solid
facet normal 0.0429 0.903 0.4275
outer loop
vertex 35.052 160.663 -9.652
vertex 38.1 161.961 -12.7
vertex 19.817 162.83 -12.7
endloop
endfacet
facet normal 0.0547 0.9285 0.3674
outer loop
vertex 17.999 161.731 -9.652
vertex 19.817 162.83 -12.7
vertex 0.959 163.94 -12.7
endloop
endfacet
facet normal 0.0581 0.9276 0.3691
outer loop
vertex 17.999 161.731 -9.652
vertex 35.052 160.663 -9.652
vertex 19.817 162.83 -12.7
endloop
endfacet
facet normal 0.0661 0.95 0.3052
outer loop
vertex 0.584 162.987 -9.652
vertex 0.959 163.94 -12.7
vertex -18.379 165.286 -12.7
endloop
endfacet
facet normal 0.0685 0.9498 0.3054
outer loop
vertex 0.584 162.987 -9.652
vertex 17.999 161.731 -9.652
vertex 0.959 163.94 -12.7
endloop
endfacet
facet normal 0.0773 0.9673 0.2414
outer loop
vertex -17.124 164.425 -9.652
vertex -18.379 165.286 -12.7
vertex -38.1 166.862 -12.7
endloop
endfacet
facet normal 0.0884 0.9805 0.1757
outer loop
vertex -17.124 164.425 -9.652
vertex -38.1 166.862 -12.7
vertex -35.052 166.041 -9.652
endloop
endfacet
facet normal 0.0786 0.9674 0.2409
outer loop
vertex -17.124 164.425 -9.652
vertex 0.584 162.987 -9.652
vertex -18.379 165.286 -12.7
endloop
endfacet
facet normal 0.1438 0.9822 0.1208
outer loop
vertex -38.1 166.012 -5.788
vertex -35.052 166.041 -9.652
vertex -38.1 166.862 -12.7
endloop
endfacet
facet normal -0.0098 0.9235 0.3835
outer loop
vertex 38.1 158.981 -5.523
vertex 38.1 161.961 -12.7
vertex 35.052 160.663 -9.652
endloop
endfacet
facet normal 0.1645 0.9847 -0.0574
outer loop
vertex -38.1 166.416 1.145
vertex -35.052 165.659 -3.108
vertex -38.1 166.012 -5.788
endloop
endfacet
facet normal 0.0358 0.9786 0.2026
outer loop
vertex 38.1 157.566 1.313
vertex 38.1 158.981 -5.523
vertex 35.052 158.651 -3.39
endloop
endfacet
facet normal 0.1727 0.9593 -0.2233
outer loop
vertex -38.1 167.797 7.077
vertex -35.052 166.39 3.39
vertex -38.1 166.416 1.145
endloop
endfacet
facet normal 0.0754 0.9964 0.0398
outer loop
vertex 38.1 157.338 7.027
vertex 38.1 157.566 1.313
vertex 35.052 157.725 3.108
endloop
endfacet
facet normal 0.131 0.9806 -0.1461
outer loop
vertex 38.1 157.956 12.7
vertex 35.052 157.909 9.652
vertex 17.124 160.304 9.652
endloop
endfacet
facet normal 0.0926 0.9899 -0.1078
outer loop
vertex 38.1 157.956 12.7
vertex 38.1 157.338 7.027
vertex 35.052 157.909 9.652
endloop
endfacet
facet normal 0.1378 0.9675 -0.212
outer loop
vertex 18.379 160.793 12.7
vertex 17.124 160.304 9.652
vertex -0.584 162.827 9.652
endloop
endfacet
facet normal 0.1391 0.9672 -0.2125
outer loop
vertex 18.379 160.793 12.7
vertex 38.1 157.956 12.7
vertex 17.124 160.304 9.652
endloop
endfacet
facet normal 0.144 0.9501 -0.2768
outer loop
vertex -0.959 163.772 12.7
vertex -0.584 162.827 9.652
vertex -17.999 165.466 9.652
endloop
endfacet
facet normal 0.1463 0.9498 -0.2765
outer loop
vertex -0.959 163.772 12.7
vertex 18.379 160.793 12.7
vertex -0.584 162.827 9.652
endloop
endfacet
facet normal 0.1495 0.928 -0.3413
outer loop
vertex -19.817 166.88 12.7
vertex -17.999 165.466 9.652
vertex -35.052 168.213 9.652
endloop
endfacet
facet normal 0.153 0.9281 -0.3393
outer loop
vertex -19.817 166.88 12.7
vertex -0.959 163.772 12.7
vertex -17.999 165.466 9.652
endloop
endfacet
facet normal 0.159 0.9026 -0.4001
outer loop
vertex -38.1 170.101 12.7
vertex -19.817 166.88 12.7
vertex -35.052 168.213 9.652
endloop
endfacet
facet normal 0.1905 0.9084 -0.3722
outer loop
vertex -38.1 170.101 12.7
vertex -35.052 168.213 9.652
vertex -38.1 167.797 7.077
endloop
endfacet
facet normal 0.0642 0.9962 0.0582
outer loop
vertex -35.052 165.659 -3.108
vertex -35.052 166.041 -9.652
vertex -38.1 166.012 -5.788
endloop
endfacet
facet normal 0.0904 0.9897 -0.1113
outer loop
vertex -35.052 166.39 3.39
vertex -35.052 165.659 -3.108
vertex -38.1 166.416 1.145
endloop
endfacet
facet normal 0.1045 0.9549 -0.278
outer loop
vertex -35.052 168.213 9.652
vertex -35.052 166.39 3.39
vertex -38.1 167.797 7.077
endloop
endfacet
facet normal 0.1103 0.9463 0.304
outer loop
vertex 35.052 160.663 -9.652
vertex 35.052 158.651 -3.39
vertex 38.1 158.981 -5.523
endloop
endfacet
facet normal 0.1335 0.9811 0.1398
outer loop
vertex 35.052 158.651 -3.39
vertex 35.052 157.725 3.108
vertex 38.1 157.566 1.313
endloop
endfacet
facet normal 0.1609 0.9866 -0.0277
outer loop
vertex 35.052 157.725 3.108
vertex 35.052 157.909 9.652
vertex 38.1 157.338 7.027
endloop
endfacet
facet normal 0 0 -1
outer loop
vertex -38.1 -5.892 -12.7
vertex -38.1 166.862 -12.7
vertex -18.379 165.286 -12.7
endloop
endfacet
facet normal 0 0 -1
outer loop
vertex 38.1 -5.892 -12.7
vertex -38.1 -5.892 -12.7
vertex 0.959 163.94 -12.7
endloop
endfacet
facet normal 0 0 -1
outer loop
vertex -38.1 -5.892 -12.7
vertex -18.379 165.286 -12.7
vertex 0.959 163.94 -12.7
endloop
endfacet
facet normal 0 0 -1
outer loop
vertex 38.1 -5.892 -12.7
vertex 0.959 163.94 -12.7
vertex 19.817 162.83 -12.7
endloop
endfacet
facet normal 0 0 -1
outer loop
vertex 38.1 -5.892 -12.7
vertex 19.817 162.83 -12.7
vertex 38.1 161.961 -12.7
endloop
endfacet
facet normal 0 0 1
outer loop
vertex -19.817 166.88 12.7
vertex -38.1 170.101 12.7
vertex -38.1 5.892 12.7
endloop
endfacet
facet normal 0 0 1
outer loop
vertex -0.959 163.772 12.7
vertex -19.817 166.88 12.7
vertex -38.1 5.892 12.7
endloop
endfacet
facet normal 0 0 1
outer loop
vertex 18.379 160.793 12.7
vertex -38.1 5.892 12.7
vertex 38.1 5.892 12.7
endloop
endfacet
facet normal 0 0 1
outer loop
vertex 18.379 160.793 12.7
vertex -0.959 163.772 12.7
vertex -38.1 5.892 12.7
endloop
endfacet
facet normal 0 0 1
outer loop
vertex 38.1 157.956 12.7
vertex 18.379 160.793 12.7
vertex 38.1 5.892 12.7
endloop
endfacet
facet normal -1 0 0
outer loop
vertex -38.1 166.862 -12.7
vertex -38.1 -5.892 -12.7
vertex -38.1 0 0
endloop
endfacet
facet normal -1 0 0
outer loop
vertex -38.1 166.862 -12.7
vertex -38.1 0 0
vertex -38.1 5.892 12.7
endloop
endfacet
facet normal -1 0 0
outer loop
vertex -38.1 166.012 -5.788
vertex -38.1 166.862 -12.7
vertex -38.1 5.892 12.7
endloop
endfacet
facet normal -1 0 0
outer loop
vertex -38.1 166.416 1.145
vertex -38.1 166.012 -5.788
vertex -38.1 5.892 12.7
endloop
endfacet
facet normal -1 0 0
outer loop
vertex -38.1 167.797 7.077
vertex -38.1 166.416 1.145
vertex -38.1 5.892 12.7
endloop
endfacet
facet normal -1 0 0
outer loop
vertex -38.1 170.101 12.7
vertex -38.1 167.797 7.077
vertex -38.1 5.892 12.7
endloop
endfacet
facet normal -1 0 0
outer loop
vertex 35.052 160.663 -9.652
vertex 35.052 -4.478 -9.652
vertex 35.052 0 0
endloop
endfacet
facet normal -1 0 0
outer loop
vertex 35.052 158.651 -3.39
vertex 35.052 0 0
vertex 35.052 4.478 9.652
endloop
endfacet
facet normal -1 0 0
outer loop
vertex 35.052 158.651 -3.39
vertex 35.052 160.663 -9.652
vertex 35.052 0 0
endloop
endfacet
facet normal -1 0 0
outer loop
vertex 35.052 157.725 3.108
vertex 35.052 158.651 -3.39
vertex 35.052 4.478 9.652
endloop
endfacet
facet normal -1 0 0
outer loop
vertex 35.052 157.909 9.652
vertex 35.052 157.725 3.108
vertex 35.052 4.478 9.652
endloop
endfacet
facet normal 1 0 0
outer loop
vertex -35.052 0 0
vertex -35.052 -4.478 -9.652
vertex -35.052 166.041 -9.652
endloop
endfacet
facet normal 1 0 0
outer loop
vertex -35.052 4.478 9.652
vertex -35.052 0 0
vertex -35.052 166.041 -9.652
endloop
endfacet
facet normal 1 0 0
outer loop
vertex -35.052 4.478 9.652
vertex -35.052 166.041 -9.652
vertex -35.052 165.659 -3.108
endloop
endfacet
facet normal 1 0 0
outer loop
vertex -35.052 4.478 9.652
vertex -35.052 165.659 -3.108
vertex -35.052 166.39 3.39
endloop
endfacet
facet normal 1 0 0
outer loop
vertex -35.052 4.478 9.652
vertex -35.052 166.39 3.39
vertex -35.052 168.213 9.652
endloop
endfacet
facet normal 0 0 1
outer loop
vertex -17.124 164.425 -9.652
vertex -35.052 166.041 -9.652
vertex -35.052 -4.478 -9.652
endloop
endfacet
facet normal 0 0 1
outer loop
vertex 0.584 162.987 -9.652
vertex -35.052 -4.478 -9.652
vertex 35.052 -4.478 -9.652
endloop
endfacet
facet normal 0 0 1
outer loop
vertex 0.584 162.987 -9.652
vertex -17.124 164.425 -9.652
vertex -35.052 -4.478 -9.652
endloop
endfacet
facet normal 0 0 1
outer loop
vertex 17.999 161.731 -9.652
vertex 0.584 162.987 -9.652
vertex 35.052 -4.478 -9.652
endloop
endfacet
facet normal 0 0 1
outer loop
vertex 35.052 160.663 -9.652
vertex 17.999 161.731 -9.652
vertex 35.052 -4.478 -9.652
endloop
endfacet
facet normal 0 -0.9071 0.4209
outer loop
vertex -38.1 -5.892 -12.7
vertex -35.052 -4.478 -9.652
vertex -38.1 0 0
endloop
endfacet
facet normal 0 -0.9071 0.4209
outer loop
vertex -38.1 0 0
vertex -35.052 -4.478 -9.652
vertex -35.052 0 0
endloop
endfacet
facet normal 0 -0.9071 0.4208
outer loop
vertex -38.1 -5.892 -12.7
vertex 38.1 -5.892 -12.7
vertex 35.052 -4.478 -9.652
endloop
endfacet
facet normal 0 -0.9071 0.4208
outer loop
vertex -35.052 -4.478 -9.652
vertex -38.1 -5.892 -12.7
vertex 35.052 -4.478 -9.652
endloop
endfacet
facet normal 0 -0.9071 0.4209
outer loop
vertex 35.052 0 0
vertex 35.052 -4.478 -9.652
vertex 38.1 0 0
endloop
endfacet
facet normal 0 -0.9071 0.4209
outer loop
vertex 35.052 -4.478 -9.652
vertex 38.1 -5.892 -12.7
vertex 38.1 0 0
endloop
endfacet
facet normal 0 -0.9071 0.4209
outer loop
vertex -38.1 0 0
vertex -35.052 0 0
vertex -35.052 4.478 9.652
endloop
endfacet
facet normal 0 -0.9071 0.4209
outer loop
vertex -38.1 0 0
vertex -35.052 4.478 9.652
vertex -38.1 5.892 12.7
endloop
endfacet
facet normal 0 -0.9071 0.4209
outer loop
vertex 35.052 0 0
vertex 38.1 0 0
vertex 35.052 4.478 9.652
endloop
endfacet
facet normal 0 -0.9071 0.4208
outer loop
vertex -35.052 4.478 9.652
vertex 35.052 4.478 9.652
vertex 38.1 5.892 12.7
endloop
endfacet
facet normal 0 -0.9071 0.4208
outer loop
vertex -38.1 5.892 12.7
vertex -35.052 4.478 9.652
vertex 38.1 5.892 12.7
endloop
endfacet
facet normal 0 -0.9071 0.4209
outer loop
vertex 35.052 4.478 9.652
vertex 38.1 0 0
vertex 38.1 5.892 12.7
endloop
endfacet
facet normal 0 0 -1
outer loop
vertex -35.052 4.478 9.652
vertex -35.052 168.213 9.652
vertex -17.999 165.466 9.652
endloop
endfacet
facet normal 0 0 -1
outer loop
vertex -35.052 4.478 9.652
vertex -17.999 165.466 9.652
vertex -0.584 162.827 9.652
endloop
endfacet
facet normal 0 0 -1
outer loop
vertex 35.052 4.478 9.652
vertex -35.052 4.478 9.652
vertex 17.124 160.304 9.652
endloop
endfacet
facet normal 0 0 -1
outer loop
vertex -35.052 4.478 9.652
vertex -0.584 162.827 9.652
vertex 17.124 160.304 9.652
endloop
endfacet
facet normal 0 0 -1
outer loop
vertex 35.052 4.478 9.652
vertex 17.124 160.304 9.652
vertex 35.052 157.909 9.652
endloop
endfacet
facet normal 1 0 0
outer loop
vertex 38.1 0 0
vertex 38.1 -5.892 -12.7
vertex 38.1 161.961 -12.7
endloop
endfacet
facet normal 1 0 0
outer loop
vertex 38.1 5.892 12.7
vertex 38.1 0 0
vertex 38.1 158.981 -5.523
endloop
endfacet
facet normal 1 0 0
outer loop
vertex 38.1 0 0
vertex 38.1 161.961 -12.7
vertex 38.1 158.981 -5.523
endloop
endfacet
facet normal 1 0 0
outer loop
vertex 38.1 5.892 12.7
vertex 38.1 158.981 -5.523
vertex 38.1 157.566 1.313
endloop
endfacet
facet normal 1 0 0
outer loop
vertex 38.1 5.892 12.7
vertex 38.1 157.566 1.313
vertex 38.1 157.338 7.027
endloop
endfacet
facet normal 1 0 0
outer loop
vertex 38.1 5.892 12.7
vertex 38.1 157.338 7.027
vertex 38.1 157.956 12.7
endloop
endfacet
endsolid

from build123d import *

# Parameters (mm, degrees)
SKETCH1_W           = 76.2
SKETCH1_H           = 25.4
SKETCH1_W_2         = 70.104
SKETCH1_H_2         = 19.304
BOSS_EXTRUDE1_DEPTH = 200
SKETCH3_W           = 76.2
SKETCH3_H           = 25.4
SKETCH3_W_2         = 70.104
SKETCH3_H_2         = 19.304
BOSS_EXTRUDE2_DEPTH = 38.1
CUT_EXTRUDE1_DEPTH  = 77.2
CUT_EXTRUDE2_START  = 13.832764
SKETCH6_R           = 38.1
CUT_EXTRUDE2_DEPTH  = 83.124802


with BuildPart() as part:
    # Sketch1 → Boss-Extrude1 (new body)
    with BuildSketch(Plane(origin=(0, 0, 0), x_dir=(1, 0, 0), z_dir=(0, 1, 0))):
        Rectangle(SKETCH1_W, SKETCH1_H)
        Rectangle(SKETCH1_W_2, SKETCH1_H_2, mode=Mode.SUBTRACT)
    extrude(amount=BOSS_EXTRUDE1_DEPTH)

    # Sketch3 → Boss-Extrude2 (add)
    with BuildSketch(Plane.XZ):
        Rectangle(SKETCH3_W, SKETCH3_H)
        Rectangle(SKETCH3_W_2, SKETCH3_H_2, mode=Mode.SUBTRACT)
    extrude(amount=BOSS_EXTRUDE2_DEPTH)

    # Sketch5 → Cut-Extrude1 (cut, through all)
    with BuildSketch(Plane(origin=(38.1, 0, 0), x_dir=(0, 0, -1), z_dir=(1, 0, 0))):
        Polygon((-27.756394936, -43.348459281), (21.22080401, -61.959922544), (71.342880626, -33.096384918), (0, 0), (-29.237931348, 13.563649542), align=None)
    extrude(amount=-CUT_EXTRUDE1_DEPTH, mode=Mode.SUBTRACT)

    # Sketch6 → Cut-Extrude2 (cut)
    with BuildSketch(Plane(origin=(56.875227758, 193.523427606, 7.656864493), x_dir=(-0.131571603, 0.016382038, 0.991171298), z_dir=(-0.984807753, 0.112143352, -0.132580384)).offset(CUT_EXTRUDE2_START)):
        Circle(SKETCH6_R)
    extrude(amount=CUT_EXTRUDE2_DEPTH, mode=Mode.SUBTRACT)


solid = part.part
